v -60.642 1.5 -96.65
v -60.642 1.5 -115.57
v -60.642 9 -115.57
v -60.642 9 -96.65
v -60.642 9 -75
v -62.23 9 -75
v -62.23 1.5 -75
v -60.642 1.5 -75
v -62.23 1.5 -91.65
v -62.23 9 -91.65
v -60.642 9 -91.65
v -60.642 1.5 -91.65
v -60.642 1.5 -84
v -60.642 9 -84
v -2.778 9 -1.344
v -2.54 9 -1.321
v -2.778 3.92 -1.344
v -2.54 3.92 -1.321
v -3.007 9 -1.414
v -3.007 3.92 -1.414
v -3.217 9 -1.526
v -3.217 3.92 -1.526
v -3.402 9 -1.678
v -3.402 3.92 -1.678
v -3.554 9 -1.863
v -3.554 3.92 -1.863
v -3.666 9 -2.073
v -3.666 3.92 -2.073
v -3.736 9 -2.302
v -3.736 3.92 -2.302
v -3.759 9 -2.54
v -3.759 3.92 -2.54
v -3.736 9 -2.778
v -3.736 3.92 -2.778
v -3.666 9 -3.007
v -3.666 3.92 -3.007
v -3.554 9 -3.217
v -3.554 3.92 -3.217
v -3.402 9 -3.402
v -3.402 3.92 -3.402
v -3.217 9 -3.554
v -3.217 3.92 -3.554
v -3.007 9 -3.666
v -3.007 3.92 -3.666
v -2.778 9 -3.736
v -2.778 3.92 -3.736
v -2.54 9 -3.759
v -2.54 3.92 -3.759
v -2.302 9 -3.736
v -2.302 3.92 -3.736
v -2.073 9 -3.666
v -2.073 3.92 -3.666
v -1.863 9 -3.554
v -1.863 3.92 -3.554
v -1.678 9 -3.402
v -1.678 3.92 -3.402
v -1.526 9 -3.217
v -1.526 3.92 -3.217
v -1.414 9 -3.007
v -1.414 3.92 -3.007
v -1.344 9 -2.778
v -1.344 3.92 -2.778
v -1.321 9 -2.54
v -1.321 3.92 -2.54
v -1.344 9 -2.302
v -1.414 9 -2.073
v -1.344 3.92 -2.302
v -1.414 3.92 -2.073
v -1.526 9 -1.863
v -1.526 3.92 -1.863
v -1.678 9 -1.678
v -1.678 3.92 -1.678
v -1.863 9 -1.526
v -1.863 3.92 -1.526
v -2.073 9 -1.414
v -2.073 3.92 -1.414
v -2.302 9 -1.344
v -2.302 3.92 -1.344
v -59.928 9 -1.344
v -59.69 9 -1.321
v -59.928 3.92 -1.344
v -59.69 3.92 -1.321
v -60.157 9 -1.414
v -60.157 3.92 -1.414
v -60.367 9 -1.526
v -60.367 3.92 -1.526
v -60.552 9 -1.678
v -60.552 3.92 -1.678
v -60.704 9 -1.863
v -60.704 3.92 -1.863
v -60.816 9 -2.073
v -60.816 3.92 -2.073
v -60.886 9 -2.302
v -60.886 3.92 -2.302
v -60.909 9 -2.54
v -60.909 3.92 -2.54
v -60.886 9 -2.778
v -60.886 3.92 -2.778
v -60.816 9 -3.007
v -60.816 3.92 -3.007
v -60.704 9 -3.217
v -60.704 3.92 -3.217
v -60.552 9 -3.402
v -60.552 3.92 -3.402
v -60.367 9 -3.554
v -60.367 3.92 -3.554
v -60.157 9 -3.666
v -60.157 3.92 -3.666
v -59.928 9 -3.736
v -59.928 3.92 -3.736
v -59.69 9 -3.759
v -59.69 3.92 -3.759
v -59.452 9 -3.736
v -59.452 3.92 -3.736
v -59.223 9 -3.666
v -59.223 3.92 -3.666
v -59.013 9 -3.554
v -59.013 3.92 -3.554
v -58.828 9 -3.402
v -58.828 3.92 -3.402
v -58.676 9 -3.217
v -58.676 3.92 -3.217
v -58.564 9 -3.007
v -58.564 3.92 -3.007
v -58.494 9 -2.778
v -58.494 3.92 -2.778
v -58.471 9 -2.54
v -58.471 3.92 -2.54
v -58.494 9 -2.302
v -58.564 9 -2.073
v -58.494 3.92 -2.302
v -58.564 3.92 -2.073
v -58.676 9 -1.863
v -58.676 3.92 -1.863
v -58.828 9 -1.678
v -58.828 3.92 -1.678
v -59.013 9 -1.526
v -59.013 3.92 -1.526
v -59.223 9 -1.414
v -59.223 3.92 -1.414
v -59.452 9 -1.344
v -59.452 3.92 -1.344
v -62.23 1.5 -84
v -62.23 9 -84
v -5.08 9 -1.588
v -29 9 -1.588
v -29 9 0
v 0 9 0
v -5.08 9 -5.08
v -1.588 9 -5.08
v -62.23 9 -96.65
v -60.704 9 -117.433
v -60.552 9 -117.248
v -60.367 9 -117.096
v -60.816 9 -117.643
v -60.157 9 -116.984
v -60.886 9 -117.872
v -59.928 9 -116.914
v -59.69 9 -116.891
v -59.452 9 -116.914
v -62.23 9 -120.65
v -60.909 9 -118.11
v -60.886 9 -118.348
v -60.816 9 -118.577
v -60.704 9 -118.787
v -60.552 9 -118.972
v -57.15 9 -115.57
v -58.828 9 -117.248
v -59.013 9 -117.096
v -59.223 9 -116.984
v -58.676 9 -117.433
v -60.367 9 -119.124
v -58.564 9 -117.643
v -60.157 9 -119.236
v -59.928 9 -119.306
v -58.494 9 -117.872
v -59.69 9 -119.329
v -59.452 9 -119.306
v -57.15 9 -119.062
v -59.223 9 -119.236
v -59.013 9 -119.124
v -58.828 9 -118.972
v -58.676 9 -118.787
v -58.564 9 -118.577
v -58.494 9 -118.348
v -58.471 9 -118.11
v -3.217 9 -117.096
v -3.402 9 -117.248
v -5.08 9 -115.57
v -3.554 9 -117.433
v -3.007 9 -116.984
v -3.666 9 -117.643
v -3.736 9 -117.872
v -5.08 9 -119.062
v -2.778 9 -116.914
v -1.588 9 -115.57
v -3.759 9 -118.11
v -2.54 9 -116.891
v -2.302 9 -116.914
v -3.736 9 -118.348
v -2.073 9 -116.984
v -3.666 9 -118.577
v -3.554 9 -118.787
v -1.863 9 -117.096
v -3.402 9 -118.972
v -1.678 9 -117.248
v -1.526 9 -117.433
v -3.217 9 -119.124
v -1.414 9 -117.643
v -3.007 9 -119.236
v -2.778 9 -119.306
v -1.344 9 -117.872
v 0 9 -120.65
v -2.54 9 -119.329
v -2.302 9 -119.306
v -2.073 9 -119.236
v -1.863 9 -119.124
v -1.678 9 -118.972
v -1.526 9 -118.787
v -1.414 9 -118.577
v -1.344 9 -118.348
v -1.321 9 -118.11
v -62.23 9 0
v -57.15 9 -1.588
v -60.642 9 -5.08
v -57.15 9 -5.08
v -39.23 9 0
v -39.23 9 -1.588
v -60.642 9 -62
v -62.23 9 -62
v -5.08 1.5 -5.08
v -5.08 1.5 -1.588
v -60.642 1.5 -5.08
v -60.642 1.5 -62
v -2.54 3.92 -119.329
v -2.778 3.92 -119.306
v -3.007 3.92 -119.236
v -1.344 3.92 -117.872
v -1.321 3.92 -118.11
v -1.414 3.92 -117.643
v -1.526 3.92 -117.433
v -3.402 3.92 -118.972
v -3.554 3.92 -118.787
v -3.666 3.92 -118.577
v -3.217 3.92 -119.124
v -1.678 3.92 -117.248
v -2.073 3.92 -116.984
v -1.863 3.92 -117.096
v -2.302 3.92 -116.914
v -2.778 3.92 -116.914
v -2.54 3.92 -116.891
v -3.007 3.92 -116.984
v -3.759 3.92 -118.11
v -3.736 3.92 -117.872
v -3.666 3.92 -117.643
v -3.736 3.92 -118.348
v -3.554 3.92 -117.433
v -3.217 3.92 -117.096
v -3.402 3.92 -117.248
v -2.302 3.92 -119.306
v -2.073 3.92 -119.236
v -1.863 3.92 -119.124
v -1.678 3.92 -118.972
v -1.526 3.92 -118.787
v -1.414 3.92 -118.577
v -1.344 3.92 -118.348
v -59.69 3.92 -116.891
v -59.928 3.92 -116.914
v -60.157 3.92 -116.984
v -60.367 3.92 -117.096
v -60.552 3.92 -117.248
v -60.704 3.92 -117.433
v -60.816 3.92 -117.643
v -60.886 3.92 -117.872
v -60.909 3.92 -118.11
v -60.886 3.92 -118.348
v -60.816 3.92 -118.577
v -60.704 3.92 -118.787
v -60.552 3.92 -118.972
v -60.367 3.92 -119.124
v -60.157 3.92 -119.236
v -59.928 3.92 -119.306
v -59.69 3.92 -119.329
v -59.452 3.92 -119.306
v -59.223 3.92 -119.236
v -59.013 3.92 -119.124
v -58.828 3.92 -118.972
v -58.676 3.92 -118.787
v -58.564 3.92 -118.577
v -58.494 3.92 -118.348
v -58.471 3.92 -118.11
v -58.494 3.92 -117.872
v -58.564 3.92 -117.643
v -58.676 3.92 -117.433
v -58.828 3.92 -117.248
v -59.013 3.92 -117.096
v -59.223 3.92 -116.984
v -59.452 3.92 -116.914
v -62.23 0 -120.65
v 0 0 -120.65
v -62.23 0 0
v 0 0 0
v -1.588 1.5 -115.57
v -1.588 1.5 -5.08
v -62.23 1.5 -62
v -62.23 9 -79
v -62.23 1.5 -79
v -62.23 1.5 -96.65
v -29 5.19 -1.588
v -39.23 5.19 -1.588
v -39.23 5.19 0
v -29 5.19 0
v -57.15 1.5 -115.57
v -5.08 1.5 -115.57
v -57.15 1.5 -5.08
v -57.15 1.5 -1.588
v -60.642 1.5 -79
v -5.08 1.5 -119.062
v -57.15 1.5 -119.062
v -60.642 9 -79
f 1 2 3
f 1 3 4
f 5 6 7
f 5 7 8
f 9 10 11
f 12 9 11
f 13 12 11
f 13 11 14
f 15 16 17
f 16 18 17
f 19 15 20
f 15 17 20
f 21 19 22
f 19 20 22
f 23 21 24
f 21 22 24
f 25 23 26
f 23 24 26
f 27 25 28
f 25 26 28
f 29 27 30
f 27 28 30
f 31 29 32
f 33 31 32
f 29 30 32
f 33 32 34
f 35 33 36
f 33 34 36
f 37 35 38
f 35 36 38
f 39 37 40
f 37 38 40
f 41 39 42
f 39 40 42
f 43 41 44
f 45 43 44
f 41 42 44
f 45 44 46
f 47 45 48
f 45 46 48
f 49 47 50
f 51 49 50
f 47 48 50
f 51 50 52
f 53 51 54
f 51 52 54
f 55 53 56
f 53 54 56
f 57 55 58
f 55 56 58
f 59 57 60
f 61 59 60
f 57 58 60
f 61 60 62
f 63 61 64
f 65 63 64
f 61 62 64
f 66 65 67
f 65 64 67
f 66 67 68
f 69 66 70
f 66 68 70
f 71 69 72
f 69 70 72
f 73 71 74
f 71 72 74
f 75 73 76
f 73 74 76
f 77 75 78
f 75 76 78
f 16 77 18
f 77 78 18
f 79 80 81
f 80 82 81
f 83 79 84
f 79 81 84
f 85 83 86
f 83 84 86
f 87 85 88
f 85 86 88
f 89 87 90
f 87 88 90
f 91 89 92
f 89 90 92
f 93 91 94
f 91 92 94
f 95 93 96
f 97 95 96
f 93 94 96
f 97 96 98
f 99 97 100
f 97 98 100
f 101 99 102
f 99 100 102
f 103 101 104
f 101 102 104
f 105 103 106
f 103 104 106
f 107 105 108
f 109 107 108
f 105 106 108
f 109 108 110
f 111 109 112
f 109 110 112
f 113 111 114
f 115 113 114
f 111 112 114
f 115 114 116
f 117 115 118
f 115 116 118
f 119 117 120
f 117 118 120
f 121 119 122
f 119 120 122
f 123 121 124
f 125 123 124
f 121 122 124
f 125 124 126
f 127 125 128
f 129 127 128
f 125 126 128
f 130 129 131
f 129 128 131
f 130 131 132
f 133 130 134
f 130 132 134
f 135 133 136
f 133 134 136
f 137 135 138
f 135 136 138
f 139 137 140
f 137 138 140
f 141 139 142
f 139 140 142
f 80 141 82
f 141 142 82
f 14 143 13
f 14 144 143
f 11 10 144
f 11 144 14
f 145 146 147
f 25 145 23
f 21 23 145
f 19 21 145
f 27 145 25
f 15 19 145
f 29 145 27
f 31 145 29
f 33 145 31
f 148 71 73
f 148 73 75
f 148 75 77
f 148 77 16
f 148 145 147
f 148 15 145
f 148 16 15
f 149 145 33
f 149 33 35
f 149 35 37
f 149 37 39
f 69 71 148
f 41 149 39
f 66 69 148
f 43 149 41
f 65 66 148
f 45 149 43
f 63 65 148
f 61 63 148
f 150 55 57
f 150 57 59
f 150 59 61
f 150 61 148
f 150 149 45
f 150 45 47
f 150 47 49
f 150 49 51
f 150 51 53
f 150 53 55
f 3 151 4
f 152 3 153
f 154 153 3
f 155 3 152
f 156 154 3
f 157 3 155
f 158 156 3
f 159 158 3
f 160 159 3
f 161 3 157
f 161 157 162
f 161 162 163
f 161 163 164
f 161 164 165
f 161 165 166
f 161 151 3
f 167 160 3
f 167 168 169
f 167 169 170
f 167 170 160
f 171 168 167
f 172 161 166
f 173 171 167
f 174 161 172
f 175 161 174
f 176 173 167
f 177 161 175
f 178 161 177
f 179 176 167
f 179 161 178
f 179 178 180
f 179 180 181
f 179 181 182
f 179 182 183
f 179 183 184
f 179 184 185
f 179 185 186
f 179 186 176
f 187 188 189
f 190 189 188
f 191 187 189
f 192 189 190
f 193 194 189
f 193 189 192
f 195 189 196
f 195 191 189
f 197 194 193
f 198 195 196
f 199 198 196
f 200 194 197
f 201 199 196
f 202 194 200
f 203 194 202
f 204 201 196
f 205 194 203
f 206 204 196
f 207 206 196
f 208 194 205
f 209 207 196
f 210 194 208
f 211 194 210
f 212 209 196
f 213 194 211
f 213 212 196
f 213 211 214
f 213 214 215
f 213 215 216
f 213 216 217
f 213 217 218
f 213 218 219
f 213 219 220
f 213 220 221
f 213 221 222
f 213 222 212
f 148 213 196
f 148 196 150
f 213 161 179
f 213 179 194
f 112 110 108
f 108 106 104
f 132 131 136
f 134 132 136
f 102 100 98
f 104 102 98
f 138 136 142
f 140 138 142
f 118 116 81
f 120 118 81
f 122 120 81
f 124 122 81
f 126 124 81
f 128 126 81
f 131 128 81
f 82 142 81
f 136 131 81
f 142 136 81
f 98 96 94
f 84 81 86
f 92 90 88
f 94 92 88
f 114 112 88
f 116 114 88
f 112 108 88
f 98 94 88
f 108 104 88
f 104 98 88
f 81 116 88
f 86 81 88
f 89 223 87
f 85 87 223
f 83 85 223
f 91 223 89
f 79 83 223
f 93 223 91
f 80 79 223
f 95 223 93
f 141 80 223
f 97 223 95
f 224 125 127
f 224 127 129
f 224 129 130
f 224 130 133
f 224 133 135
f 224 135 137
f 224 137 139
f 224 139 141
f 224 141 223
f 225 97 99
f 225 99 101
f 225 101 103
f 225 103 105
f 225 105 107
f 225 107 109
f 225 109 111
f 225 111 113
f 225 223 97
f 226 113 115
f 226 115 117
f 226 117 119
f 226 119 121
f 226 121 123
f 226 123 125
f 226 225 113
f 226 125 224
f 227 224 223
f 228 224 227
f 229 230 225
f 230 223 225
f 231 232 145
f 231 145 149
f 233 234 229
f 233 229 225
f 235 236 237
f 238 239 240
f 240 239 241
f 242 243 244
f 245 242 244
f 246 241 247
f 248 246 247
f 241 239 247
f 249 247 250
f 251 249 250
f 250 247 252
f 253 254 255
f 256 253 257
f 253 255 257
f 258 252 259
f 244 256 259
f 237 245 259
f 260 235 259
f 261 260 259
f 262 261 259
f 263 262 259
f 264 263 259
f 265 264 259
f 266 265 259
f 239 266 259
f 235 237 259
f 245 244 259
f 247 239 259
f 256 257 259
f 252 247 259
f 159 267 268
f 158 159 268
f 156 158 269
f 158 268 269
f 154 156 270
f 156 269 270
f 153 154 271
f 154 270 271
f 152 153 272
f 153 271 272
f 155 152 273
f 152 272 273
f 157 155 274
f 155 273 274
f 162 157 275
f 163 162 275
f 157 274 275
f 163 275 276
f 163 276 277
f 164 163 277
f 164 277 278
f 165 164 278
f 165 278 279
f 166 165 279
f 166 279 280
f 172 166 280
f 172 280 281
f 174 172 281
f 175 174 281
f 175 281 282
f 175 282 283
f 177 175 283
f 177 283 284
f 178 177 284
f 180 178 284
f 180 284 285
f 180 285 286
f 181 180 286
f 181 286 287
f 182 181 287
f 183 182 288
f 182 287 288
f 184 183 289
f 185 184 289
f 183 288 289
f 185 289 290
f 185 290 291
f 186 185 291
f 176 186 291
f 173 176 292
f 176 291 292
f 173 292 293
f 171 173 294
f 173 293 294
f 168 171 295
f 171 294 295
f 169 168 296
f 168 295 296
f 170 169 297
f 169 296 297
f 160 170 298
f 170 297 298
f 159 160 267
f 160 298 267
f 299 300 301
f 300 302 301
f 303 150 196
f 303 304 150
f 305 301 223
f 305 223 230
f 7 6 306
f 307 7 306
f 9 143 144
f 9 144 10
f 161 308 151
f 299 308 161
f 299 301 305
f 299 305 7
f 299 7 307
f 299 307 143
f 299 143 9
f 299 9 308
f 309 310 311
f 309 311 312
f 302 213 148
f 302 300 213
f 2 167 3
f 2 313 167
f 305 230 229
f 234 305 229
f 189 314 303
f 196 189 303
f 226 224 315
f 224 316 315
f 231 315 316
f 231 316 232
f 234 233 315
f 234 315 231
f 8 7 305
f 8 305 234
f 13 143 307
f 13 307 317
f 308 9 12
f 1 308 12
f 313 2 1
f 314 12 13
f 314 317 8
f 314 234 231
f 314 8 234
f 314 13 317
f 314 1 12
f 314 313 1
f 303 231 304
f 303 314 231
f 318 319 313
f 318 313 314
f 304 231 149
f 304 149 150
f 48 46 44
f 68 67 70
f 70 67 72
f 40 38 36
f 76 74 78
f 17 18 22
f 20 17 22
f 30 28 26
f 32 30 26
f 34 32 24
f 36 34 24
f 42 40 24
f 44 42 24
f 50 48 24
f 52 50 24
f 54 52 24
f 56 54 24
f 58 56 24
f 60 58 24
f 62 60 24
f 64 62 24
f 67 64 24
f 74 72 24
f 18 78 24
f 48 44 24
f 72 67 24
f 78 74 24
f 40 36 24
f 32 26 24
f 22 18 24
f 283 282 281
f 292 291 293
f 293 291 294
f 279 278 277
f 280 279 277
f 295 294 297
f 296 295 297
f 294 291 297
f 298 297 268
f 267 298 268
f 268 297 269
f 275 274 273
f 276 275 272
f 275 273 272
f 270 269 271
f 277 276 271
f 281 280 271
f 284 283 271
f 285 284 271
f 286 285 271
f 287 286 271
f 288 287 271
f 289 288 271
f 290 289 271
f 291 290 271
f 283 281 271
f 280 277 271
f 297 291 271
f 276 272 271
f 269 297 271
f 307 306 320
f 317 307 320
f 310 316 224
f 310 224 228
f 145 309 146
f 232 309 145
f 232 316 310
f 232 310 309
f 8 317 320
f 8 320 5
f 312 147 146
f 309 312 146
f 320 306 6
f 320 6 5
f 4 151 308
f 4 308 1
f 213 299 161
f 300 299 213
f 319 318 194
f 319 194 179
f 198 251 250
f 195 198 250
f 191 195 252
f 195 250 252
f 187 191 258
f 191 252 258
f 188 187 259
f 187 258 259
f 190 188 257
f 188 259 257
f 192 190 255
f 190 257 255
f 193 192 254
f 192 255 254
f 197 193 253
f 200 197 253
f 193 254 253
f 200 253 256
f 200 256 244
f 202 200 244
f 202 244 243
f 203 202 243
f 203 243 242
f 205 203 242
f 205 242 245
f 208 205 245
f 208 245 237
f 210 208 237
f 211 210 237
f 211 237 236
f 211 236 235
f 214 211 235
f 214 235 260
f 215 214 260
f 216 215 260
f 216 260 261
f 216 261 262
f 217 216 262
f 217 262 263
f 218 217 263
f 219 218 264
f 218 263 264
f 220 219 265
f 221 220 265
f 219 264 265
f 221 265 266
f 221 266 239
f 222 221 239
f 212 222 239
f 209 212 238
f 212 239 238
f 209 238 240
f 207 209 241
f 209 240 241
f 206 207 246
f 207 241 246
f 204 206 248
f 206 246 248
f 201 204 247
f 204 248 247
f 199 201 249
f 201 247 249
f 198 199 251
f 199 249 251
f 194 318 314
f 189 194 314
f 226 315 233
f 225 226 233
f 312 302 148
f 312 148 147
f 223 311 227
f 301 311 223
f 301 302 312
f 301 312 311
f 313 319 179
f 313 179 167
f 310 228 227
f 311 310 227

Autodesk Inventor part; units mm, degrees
ref_plane "YZ Plane" through (0, 0, 0) normal (1, 0, 0) x (0, 1, 0)
ref_plane "XZ Plane" through (0, 0, 0) normal (0, 1, 0) x (-1, 0, 0)
ref_plane "XY Plane" through (0, 0, 0) normal (0, 0, 1) x (1, 0, 0)
sketch "Sketch1" plane through (0, 0, 0) normal (0, 1, 0) x (-1, 0, 0)
  line L0 (0, 0) -> (62.23, 0)
  line L1 (62.23, 0) -> (62.23, -120.65)
  line L2 (62.23, -120.65) -> (0, -120.65)
  line L3 (0, -120.65) -> (0, 0)
  dimension "d0" = 62.23
  dimension "d1" = 120.65
extrude "Extrusion1" add sketch "Sketch1" along normal blind 1.5
sketch "Sketch2" plane through (0, 1.5, 0) normal (0, 1, 0) x (1, 0, 0)
  line L0 (-60.6425, 1.5875) -> (-1.5875, 1.5875)
  line L1 (-1.5875, 1.5875) -> (-1.5875, 119.0625)
  line L2 (-1.5875, 119.0625) -> (-60.6425, 119.0625)
  line L3 (-60.6425, 119.0625) -> (-60.6425, 1.5875)
  line L4 (-62.23, 0) -> (0, 0) projected
  line L5 (0, 0) -> (0, 120.65) projected
  line L6 (-62.23, 120.65) -> (-62.23, 0) projected
  line L7 (0, 120.65) -> (-62.23, 120.65) projected
  line L8 (0, 0) -> (-5.08, 0)
  line L9 (-5.08, 0) -> (-5.08, 5.08)
  line L10 (-5.08, 5.08) -> (0, 5.08)
  line L11 (0, 5.08) -> (0, 0)
  line L12 (-62.23, 0) -> (-57.15, 0)
  line L13 (-57.15, 0) -> (-57.15, 5.08)
  line L14 (-57.15, 5.08) -> (-62.23, 5.08)
  line L15 (-62.23, 5.08) -> (-62.23, 0)
  line L16 (0, 120.65) -> (-5.08, 120.65)
  line L17 (-5.08, 120.65) -> (-5.08, 115.57)
  line L18 (-5.08, 115.57) -> (0, 115.57)
  line L19 (0, 115.57) -> (0, 120.65)
  line L20 (-62.23, 120.65) -> (-57.15, 120.65)
  line L21 (-57.15, 120.65) -> (-57.15, 115.57)
  line L22 (-57.15, 115.57) -> (-62.23, 115.57)
  line L23 (-62.23, 115.57) -> (-62.23, 120.65)
  point P0 (0, 115.57)
  point P1 (-1.5875, 115.57)
  point P2 (-1.5875, 5.08)
  point P3 (-5.08, 1.5875)
  point P4 (-57.15, 1.5875)
  point P5 (-60.6425, 5.08)
  point P6 (-5.08, 119.0625)
  point P7 (-60.6425, 115.57)
  point P8 (-57.15, 119.0625)
  dimension "d4" = 1.5875
  dimension "d5" = 1.5875
  dimension "d6" = 1.5875
  dimension "d7" = 1.5875
  dimension "d8" = 5.08
  dimension "d9" = 5.08
  dimension "d10" = 5.08
  dimension "d11" = 5.08
  dimension "d12" = 5.08
  dimension "d13" = 5.08
  dimension "d14" = 5.08
  dimension "d15" = 5.08
extrude "Extrusion3" add sketch "Sketch2" along normal blind 7.5 contours L3 L14 L13 L0 | L0 L13 L4 L6 L14 L3 | L0 L9 L4 L13 | L14 L6 L22 L3 | L9 L10 L1 L0 | L0 L1 L10 L5 L4 L9 | L22 L6 L7 L21 L2 L3 | L3 L2 L21 L22 | L1 L18 L5 L10 | L21 L7 L17 L2 | L18 L17 L2 L1 | L1 L2 L17 L7 L5 L18
sketch "Sketch3" plane through (0, 9, 0) normal (0, 1, 0) x (1, 0, 0)
  line L0 (-62.23, 0) -> (0, 0) projected
  line L1 (-39.23, 0) -> (-29, 0)
  line L2 (-29, 0) -> (-29, 1.5875)
  line L3 (-29, 1.5875) -> (-39.23, 1.5875)
  line L4 (-39.23, 1.5875) -> (-39.23, 0)
  line L5 (0, 0) -> (0, 120.65) projected
  line L6 (-62.23, 120.65) -> (-62.23, 0) projected
  line L7 (0, 120.65) -> (-62.23, 120.65) projected
  line L8 (-60.6425, 115.57) -> (-60.6425, 5.08) projected
  line L9 (-62.23, 60.325) -> (-60.6425, 60.325)
  line L10 (-60.6425, 60.325) -> (-60.6425, 98.425)
  line L11 (-60.6425, 98.425) -> (-62.23, 98.425)
  line L12 (-62.23, 98.425) -> (-62.23, 60.325)
  point P0 (-59.69, 2.54)
  point P1 (-59.69, 118.11)
  point P2 (-2.54, 118.11)
  point P3 (-2.54, 2.54)
  dimension "d20" = 29
  dimension "d21" = 23
  dimension "d22" = 2.54
  dimension "d23" = 2.54
  dimension "d24" = 2.54
  dimension "d25" = 2.54
  dimension "d26" = 2.54
  dimension "d27" = 2.54
  dimension "d28" = 2.54
  dimension "d29" = 2.54
  dimension "d47" = 60.325
  dimension "d48" = 22.225
extrude "Extrusion4" cut sketch "Sketch3" against normal blind 3.81 contours L4 L3 L2 L0
sketch "Sketch4" plane through (0, 9, 0) normal (0, 1, 0) x (1, 0, 0)
  line L0 (-29, 0) -> (0, 0) projected
  line L1 (0, 0) -> (0, 120.65) projected
  line L2 (-62.23, 0) -> (-39.23, 0) projected
  line L3 (-62.23, 120.65) -> (-62.23, 0) projected
  line L4 (0, 120.65) -> (-62.23, 120.65) projected
  point P0 (-2.54, 2.54)
  point P1 (-2.54, 118.11)
  point P2 (-59.69, 118.11)
  point P3 (-59.69, 2.54)
  dimension "d39" = 2.54
  dimension "d40" = 2.54
  dimension "d41" = 2.54
  dimension "d42" = 2.54
  dimension "d43" = 2.54
  dimension "d44" = 2.54
  dimension "d45" = 2.54
  dimension "d46" = 2.54
hole "Hole1" at (-2.54, 9, -2.54) at (-2.54, 9, -118.11) at (-59.69, 9, -118.11) at (-59.69, 9, -2.54) direction (0, -1, 0) diameter 2.4384 depth 5.08 clearance for "Socket Head Cap Screw" size "#2" standard "Ansi Unified Screw Threads"
sketch "Sketch5" plane through (0, 9, 0) normal (0, 1, 0) x (1, 0, 0)
  line L0 (-62.23, 91.65) -> (-60.6425, 91.65)
  line L1 (-60.6425, 5.08) -> (-60.6425, 115.57) projected
  line L2 (-62.23, 120.65) -> (-62.23, 0) projected
  line L3 (-62.23, 79) -> (-60.6425, 79)
  line L4 (-62.23, 84) -> (-60.6425, 84)
  line L5 (-62.23, 75) -> (-60.6425, 75)
  line L6 (-62.23, 62) -> (-60.6425, 62)
  line L7 (-62.23, 0) -> (-39.23, 0) projected
  line L8 (0, 120.65) -> (-62.23, 120.65) projected
  line L9 (-62.23, 96.65) -> (-60.6425, 96.65)
  point P0 (0, 0)
  dimension "d49" = 62
  dimension "d50" = 75
  dimension "d51" = 79
  dimension "d52" = 5
  dimension "d53" = 29
  dimension "d54" = 5
extrude "Extrusion5" cut sketch "Sketch5" against normal up to surface (7.5 mm away) contours L2 L9 L1 L0 | L4 L1 L3 L2 | L5 L1 L6 L2
equation "\"d4\" = d5"
equation "\"d6\" = d5"
equation "\"d7\" = d5"
equation "\"d10\" = d8"
equation "\"d11\" = d10"
equation "\"d12\" = d8"
equation "\"d13\" = d8"
equation "\"d14\" = d8"
equation "\"d15\" = d8"
equation "\"d24\" = d22"
equation "\"d25\" = d24"
equation "\"d26\" = d25"
equation "\"d27\" = d26"
equation "\"d28\" = d22"
equation "\"d29\" = d28"
equation "\"d40\" = d39"
equation "\"d41\" = d39"
equation "\"d42\" = d41"
equation "\"d43\" = d42"
equation "\"d44\" = d43"
equation "\"d45\" = d44"
equation "\"d46\" = d45"
properties part number "cover_bottom"
